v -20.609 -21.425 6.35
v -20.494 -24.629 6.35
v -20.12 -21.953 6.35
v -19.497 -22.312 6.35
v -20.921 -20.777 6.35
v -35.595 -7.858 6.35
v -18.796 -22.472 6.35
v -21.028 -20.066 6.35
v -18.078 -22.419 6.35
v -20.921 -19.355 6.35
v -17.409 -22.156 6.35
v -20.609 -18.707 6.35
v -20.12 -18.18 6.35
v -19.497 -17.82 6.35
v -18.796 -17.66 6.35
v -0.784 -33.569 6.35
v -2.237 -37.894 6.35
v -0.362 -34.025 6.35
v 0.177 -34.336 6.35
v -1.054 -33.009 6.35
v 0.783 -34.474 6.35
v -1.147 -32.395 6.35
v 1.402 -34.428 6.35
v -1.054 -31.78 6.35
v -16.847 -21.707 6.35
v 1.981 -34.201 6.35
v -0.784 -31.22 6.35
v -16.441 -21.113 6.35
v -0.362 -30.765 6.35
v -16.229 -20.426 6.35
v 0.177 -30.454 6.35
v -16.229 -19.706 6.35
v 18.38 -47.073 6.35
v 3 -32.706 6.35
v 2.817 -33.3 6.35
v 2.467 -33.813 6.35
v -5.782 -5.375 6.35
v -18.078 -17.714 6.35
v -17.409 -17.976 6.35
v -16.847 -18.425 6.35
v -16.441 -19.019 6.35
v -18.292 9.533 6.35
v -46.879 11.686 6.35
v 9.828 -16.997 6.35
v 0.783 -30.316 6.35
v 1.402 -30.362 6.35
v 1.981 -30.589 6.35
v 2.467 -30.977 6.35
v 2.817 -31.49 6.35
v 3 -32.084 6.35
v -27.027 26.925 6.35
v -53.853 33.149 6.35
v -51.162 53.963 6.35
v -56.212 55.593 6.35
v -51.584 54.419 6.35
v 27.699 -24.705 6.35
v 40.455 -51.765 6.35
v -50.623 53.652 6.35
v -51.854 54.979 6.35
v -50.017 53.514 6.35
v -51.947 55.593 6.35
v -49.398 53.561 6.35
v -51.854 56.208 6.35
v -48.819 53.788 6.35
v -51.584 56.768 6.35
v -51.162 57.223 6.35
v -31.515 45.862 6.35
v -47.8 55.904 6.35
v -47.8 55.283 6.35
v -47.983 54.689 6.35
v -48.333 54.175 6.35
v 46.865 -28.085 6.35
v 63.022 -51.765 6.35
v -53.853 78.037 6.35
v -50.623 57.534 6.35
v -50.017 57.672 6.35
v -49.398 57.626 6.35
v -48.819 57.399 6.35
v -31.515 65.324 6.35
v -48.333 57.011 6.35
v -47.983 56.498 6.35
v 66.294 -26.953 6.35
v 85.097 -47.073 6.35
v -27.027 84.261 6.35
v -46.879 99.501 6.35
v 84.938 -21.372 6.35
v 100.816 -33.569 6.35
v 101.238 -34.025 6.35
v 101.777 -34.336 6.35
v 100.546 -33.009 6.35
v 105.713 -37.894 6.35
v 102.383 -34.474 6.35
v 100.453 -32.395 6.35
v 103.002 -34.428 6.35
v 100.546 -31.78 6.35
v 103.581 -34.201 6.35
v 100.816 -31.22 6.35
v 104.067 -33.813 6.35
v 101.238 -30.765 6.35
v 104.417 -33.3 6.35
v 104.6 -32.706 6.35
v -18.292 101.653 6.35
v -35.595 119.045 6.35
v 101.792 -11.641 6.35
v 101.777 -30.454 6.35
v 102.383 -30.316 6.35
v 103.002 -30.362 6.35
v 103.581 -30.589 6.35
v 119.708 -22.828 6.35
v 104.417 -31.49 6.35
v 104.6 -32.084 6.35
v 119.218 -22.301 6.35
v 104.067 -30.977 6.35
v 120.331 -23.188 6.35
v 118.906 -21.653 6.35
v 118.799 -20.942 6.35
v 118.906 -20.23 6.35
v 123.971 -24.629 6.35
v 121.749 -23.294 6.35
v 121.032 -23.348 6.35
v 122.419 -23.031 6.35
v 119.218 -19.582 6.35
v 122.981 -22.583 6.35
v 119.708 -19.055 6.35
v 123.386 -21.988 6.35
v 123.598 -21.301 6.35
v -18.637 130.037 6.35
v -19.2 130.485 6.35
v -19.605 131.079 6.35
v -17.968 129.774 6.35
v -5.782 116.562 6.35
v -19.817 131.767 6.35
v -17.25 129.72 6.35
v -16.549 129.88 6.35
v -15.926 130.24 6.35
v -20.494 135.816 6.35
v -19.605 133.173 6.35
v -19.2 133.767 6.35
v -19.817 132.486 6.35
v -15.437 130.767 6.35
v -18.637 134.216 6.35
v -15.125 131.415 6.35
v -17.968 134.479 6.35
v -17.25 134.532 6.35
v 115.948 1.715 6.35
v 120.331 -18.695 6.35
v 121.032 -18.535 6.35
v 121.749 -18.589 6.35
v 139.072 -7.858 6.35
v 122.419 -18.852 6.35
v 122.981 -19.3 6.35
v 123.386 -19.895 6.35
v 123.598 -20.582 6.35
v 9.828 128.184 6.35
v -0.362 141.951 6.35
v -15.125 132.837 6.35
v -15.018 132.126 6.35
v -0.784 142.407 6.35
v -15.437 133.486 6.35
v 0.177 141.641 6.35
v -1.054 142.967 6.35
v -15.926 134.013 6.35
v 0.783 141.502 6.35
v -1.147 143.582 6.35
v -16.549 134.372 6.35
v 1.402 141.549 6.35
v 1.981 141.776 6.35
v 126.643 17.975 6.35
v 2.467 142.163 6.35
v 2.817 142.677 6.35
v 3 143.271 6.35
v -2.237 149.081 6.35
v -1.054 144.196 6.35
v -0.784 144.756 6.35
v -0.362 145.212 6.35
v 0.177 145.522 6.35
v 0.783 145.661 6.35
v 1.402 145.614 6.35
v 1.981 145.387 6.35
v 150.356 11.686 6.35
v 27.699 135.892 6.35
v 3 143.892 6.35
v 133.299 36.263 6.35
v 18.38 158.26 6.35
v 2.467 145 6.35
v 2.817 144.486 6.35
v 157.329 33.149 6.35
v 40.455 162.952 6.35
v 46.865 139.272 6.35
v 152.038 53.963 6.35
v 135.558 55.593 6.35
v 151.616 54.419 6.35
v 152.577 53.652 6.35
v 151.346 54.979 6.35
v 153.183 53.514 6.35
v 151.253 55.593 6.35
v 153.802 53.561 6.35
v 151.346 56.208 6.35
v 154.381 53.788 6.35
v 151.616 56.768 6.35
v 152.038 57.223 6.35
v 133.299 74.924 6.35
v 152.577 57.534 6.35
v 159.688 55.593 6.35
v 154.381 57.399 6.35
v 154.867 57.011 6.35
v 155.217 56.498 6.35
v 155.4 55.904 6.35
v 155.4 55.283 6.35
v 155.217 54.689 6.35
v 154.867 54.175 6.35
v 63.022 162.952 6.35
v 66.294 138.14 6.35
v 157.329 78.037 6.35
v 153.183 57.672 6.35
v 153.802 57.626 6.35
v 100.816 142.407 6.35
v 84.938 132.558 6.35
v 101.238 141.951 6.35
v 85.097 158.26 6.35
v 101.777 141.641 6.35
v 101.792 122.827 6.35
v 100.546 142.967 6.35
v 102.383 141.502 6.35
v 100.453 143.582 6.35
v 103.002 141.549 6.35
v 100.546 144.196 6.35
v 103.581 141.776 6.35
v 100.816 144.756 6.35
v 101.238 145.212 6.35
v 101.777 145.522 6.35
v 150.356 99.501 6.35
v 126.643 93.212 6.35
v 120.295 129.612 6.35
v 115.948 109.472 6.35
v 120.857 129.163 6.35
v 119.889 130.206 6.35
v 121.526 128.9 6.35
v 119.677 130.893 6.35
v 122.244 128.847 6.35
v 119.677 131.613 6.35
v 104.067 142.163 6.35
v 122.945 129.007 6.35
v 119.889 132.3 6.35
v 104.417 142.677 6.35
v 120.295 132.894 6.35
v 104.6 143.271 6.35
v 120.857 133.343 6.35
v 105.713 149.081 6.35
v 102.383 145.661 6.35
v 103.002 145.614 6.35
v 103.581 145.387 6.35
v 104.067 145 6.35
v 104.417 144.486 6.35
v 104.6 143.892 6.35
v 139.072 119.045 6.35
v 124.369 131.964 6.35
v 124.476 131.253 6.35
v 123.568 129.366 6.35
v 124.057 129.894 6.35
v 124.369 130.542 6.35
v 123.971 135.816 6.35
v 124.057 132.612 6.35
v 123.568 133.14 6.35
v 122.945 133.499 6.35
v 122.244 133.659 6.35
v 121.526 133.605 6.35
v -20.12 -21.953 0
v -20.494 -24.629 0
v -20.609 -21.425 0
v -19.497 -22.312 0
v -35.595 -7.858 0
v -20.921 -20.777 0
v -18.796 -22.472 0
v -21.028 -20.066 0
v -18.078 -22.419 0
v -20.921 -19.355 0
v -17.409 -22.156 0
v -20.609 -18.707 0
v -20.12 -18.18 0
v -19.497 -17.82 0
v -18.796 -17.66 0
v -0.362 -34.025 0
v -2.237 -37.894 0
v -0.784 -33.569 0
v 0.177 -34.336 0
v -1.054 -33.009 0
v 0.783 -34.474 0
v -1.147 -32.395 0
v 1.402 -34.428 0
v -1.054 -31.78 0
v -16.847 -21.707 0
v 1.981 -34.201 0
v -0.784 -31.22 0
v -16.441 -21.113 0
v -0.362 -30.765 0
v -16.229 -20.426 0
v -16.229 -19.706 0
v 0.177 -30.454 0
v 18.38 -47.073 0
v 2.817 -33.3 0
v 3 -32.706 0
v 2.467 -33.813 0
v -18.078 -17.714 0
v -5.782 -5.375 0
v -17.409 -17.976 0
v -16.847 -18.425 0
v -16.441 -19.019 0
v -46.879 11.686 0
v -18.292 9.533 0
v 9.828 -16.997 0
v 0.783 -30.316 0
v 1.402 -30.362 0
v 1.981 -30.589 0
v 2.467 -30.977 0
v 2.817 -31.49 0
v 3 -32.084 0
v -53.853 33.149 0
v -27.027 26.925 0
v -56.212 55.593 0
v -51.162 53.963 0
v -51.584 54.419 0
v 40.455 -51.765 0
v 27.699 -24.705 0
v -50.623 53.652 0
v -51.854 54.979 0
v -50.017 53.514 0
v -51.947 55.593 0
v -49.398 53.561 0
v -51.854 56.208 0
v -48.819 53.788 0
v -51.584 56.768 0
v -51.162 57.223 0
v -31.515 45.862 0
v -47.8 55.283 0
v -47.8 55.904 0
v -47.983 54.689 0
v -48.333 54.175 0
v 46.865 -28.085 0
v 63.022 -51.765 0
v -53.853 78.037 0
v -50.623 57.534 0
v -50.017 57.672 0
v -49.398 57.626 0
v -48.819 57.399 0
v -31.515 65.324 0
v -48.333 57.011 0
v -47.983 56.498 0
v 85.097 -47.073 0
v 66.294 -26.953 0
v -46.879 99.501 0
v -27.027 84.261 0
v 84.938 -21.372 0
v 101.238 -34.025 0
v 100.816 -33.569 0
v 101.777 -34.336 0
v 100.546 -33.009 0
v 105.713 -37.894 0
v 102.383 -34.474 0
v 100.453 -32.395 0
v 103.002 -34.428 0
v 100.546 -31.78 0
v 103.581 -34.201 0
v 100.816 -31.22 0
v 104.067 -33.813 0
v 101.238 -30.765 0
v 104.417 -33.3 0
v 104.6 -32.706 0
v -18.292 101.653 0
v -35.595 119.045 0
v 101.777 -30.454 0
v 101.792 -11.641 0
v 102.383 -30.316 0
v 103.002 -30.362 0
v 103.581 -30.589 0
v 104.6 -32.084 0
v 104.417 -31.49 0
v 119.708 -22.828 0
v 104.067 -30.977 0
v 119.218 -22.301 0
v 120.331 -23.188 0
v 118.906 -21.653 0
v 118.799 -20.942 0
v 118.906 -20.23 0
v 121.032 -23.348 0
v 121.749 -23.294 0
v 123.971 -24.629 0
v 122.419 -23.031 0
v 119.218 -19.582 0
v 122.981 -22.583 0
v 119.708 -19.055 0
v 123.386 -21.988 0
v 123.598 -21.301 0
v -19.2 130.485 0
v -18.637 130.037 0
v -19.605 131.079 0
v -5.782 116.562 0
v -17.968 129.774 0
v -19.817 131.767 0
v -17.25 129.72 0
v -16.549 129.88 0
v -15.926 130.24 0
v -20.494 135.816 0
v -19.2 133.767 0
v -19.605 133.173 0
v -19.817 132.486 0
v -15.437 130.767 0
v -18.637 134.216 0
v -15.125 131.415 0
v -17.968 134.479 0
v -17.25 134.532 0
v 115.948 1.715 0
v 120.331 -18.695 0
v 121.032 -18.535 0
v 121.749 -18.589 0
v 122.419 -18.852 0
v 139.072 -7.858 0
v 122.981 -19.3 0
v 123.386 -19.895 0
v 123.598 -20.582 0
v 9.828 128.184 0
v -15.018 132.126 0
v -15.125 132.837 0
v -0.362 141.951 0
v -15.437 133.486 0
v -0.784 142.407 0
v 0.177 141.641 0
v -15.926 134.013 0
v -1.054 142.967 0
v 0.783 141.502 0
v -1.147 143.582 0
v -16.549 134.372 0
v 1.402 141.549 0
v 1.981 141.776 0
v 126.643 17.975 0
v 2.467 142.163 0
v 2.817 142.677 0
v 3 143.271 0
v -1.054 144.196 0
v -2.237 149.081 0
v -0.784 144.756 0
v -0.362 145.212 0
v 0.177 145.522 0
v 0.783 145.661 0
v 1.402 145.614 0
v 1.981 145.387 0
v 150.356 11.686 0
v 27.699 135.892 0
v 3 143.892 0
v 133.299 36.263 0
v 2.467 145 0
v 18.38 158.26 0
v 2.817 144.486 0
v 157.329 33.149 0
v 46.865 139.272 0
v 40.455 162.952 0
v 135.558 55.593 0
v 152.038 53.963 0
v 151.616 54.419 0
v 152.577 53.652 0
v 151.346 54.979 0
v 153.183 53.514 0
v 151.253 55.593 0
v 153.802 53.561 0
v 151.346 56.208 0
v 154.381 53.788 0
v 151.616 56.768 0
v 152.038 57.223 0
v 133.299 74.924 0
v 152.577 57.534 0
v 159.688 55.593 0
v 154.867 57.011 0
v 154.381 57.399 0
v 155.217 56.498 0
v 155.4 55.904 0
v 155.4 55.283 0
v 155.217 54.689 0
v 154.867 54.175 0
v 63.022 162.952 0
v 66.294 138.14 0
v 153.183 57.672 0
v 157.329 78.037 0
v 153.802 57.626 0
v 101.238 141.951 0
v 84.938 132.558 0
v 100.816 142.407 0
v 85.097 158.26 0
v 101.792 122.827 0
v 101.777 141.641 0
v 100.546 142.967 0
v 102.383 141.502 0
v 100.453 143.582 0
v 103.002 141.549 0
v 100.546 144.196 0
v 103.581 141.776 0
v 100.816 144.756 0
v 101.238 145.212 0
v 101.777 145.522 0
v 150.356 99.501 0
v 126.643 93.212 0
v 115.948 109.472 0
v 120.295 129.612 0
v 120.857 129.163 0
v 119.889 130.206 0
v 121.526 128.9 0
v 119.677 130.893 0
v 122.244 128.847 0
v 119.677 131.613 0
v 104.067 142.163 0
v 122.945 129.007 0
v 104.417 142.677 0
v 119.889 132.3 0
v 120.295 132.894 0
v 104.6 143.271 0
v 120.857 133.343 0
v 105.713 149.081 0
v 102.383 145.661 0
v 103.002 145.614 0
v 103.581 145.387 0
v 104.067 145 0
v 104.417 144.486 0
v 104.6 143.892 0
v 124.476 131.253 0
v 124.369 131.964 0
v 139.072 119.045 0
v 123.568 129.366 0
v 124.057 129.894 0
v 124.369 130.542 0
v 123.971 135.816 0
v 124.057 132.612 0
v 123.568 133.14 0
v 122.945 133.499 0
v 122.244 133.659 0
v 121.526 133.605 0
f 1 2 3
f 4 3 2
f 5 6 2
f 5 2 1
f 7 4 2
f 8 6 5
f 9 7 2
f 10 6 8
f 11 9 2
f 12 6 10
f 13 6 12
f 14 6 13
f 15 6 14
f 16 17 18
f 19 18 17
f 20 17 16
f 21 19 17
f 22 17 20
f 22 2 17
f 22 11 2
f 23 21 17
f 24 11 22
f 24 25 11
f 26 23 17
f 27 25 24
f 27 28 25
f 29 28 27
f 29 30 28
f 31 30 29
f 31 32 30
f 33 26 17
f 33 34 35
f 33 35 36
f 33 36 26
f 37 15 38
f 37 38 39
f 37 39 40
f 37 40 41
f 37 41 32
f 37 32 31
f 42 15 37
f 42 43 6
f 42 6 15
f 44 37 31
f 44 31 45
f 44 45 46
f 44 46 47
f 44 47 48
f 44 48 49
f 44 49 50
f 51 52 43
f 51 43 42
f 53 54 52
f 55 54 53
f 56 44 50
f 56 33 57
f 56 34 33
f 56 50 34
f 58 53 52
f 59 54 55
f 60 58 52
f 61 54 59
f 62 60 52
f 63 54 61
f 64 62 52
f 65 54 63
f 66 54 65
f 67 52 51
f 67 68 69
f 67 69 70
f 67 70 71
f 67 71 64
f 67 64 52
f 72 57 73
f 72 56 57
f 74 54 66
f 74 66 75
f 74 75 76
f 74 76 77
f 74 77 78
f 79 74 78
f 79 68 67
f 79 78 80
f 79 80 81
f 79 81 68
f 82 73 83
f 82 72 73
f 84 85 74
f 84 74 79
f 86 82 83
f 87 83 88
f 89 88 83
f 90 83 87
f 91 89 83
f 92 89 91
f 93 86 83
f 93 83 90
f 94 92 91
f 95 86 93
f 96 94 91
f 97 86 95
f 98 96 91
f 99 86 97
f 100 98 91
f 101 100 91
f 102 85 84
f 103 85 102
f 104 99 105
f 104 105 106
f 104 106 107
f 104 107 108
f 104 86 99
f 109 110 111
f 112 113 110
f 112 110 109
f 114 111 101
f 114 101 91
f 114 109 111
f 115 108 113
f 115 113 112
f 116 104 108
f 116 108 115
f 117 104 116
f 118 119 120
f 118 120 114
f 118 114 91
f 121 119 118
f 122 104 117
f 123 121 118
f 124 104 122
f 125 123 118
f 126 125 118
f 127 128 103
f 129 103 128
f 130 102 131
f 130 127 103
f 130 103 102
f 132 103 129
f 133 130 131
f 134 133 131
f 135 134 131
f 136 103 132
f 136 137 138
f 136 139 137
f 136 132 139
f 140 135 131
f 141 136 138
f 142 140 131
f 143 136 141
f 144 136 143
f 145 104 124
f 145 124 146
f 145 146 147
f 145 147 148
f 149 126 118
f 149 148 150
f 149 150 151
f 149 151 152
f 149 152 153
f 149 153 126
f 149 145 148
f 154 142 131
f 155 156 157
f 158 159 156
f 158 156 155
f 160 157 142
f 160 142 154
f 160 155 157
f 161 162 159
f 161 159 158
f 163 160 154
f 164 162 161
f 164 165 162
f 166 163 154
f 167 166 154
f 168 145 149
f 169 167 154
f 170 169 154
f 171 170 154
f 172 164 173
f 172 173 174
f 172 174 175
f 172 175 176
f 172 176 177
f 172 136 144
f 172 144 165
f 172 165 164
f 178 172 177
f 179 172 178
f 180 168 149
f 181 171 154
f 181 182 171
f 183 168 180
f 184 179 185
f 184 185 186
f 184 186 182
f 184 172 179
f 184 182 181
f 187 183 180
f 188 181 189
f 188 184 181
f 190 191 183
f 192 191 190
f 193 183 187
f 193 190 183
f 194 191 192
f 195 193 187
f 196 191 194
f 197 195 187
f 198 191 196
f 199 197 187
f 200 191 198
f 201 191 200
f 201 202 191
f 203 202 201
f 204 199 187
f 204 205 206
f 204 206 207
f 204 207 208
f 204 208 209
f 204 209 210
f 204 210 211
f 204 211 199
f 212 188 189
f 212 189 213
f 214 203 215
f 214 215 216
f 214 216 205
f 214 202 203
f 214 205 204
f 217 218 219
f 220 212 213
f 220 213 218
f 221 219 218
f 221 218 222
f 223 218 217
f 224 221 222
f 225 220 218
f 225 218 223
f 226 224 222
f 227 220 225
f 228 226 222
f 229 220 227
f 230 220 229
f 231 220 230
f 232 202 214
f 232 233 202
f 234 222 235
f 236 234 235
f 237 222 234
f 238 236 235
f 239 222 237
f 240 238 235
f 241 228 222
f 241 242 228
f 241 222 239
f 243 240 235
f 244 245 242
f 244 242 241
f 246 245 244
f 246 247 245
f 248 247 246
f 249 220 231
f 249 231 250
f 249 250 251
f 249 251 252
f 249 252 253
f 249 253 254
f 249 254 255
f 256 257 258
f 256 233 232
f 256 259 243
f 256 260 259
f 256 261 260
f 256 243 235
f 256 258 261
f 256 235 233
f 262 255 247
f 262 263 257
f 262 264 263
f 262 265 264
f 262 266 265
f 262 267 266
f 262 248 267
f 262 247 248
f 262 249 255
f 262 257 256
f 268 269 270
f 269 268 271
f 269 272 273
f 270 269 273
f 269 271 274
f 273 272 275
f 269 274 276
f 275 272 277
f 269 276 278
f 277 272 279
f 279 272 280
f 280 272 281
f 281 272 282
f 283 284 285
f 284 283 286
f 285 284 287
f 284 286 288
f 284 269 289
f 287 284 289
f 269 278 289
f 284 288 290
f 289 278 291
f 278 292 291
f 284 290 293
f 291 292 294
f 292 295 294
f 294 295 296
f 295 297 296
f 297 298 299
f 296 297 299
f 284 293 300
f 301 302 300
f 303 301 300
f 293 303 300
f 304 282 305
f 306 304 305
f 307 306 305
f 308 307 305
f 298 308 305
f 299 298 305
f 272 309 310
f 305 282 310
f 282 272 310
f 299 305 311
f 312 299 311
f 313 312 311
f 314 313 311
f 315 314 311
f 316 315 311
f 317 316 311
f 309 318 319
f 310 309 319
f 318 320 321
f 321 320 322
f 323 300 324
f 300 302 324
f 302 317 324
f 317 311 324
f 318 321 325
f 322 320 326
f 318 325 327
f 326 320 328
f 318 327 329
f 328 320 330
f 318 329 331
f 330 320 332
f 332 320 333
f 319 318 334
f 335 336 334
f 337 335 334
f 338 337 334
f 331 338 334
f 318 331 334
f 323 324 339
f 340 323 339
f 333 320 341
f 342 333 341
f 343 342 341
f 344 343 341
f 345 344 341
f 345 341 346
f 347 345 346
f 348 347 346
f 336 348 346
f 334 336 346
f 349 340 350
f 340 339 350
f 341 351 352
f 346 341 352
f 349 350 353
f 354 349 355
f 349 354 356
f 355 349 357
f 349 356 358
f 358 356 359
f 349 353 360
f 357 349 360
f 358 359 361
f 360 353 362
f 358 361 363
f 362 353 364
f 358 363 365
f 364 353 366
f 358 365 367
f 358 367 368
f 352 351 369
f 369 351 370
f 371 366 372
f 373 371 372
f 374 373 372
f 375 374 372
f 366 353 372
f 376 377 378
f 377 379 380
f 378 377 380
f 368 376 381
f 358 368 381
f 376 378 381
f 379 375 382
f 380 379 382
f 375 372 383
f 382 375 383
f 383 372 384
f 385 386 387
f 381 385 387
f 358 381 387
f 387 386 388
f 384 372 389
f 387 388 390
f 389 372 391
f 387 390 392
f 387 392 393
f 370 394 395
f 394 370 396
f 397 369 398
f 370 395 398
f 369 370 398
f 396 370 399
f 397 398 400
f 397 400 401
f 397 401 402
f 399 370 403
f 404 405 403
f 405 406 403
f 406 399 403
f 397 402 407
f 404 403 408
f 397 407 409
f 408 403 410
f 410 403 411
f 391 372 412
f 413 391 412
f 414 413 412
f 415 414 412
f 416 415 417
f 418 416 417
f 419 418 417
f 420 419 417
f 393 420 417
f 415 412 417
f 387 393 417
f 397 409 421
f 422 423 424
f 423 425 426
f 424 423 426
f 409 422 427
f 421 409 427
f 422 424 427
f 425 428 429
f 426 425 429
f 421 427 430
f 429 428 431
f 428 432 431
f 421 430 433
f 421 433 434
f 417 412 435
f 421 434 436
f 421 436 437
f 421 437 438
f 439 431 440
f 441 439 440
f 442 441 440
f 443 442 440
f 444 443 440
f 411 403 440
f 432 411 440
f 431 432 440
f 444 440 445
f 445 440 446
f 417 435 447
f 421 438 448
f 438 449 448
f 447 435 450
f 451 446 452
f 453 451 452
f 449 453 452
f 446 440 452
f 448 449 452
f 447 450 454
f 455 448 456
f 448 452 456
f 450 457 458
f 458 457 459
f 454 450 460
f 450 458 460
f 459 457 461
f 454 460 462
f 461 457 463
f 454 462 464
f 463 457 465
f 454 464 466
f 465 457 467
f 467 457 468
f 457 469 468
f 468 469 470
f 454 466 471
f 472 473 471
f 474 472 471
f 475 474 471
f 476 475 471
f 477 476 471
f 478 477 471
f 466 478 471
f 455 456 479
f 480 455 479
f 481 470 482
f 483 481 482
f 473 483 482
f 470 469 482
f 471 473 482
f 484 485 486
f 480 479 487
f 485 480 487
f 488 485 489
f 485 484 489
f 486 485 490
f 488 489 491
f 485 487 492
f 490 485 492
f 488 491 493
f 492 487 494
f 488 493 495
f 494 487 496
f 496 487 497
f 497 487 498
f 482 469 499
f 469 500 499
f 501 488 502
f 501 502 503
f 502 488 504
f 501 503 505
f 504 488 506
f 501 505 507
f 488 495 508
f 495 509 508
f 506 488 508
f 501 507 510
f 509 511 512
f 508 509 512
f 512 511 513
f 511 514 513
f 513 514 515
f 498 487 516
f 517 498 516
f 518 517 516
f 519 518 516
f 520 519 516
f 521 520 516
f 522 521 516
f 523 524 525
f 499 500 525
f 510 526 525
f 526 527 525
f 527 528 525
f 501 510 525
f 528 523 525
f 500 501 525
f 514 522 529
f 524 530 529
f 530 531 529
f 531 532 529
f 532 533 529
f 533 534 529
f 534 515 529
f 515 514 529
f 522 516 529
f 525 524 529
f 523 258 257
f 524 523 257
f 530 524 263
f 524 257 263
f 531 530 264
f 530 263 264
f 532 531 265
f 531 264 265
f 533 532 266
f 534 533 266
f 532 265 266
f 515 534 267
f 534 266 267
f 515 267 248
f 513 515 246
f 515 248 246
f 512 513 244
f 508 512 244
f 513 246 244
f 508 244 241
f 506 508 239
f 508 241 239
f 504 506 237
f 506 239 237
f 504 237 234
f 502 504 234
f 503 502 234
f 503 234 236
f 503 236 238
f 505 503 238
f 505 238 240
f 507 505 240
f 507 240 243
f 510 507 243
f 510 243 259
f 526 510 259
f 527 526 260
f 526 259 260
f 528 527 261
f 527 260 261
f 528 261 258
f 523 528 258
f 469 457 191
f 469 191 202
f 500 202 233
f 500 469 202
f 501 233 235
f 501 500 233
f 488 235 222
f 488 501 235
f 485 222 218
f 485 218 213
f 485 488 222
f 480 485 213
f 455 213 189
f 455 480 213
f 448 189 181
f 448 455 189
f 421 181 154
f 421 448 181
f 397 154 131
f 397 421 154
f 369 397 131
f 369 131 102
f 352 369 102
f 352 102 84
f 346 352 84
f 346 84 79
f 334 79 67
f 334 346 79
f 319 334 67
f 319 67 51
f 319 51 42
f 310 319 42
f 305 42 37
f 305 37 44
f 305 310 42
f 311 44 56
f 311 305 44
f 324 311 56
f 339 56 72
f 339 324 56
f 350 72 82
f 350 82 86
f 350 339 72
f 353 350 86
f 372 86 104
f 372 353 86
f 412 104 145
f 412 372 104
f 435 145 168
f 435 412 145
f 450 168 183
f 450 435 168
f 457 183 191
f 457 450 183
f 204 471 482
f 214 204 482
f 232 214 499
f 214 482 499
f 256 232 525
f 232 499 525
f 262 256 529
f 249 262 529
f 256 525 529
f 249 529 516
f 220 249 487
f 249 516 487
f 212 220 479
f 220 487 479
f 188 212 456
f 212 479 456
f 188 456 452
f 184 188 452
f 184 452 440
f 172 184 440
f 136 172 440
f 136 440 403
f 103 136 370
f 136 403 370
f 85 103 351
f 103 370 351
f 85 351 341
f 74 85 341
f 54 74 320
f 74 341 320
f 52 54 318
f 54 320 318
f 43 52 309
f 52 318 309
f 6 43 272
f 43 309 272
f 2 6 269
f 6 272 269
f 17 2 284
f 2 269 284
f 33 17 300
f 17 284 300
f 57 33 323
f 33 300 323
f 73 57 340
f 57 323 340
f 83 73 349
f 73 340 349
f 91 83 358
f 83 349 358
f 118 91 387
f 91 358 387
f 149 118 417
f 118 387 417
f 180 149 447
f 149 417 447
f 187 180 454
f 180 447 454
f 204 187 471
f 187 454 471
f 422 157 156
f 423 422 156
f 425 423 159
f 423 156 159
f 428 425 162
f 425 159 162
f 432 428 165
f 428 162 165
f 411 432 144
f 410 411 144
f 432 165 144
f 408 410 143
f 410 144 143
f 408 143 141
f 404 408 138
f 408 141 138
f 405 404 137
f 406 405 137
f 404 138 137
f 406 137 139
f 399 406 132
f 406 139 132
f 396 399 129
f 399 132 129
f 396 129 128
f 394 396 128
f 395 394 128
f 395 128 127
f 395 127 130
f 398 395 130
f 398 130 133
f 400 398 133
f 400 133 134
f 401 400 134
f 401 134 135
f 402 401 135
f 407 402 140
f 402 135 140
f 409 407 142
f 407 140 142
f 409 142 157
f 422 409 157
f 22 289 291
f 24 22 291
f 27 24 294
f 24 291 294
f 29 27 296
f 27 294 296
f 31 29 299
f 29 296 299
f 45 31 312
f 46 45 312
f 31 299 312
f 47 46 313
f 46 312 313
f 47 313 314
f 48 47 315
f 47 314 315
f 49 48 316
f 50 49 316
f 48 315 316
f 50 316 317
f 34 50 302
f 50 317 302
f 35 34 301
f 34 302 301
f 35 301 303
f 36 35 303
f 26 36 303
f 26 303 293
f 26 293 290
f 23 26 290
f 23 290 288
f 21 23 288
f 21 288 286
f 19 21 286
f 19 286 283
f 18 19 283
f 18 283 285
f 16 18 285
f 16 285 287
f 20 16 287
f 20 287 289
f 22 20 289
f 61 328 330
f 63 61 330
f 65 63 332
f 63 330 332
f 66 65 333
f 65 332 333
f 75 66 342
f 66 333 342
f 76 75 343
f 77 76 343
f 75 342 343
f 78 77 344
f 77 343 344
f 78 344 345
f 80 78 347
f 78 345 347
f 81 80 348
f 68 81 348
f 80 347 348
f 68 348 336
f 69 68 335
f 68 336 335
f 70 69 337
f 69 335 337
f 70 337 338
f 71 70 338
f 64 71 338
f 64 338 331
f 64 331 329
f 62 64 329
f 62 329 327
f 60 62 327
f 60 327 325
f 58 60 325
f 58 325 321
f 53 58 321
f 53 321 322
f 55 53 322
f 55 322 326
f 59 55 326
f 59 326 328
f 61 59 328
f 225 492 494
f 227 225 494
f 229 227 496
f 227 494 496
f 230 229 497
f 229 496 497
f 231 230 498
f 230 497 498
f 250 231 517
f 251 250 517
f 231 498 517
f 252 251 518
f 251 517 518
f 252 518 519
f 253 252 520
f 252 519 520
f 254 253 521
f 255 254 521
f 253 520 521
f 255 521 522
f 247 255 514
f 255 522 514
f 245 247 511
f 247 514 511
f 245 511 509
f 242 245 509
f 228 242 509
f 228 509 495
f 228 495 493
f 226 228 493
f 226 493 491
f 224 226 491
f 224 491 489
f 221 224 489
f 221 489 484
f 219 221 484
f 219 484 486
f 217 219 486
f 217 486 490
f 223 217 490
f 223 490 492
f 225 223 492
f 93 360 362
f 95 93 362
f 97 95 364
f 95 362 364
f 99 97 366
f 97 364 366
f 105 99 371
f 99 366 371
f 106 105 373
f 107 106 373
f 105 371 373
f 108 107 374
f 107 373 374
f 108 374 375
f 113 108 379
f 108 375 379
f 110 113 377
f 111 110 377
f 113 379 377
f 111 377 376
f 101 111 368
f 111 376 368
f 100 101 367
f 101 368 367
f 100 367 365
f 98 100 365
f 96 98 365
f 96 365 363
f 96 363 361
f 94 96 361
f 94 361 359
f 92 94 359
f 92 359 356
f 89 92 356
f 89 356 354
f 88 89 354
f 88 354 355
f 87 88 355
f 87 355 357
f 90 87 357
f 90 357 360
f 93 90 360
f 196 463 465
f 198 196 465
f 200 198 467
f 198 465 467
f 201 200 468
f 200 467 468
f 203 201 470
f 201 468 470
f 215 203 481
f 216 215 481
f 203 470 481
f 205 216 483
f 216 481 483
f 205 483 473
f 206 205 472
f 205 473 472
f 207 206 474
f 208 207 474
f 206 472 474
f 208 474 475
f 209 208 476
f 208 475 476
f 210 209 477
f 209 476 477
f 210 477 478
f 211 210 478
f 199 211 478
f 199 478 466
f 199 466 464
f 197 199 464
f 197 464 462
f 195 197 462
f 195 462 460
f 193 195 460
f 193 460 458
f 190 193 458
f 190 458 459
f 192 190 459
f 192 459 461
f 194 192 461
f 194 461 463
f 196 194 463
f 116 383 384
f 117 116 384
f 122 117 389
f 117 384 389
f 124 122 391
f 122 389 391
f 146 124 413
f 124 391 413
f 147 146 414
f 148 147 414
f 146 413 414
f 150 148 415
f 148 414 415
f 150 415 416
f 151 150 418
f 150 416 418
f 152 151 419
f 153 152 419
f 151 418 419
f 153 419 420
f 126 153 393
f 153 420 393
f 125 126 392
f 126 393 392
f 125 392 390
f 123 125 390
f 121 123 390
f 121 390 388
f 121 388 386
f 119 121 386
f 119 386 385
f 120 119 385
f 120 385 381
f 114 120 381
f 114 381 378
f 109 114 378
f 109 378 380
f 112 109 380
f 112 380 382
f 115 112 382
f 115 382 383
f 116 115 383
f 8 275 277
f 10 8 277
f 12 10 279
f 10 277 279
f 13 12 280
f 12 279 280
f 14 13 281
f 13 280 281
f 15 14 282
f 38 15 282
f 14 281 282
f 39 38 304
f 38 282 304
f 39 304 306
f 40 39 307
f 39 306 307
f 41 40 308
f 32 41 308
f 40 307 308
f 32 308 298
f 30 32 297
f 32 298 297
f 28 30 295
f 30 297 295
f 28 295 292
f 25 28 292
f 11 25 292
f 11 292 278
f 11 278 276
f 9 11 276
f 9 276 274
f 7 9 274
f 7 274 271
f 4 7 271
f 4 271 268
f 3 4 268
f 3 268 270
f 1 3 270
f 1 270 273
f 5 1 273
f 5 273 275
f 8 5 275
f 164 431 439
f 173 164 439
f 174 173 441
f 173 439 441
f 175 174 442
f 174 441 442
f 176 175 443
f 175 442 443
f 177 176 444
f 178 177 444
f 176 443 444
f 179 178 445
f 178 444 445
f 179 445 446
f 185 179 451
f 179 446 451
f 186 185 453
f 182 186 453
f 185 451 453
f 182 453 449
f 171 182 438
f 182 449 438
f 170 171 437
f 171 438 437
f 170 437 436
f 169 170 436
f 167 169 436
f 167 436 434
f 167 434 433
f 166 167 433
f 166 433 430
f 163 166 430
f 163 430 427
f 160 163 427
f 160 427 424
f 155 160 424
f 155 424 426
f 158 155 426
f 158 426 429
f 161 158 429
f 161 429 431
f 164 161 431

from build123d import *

# Parameters (mm, degrees)
SKETCH1_R           = 107.95
SKETCH1_R_2         = 83.82
BOSS_EXTRUDE1_DEPTH = 6.35
SKETCH2_R           = 2.085
SKETCH2_R_2         = 2.413
CUT_EXTRUDE1_DEPTH  = 21.336
SKETCH5_R           = 2.413
CUT_EXTRUDE4_DEPTH  = 6.35


with BuildPart() as part:
    # Sketch1 → Boss-Extrude1 (new body)
    with BuildSketch(Plane.XY):
        with Locations((51.738381467, 55.593319394)):
            Circle(SKETCH1_R)
        with Locations((51.738381467, 55.593319394)):
            Circle(SKETCH1_R_2, mode=Mode.SUBTRACT)
    extrude(amount=BOSS_EXTRUDE1_DEPTH)

    # Sketch2 → Cut-Extrude1 (cut)
    with BuildSketch(Plane(origin=(0, 0, 0), x_dir=(-1, 0, 0), z_dir=(0, 0, -1))):
        with Locations((-0.938381467, -32.39486163)):
            Circle(SKETCH2_R)
        with Locations((-102.538381467, -32.39486163)):
            Circle(SKETCH2_R)
        with Locations((-153.338381467, 55.593319394)):
            Circle(SKETCH2_R)
        with Locations((-102.538381467, 143.581500419)):
            Circle(SKETCH2_R)
        with Locations((-0.938381467, 143.581500419)):
            Circle(SKETCH2_R)
        with Locations((49.861618533, 55.593319394)):
            Circle(SKETCH2_R)
        with Locations((-121.212212689, -20.941506669)):
            Circle(SKETCH2_R_2)
        with Locations((18.615381385, -20.066128285)):
            Circle(SKETCH2_R_2)
    extrude(amount=-CUT_EXTRUDE1_DEPTH, mode=Mode.SUBTRACT)

    # Sketch5 → Cut-Extrude4 (cut)
    with BuildSketch(Plane.XY.offset(6.35)):
        with Locations((122.06341072, 131.252946958)):
            Circle(SKETCH5_R)
        with Locations((-17.430655728, 132.126237322)):
            Circle(SKETCH5_R)
    extrude(amount=-CUT_EXTRUDE4_DEPTH, mode=Mode.SUBTRACT)


solid = part.part
